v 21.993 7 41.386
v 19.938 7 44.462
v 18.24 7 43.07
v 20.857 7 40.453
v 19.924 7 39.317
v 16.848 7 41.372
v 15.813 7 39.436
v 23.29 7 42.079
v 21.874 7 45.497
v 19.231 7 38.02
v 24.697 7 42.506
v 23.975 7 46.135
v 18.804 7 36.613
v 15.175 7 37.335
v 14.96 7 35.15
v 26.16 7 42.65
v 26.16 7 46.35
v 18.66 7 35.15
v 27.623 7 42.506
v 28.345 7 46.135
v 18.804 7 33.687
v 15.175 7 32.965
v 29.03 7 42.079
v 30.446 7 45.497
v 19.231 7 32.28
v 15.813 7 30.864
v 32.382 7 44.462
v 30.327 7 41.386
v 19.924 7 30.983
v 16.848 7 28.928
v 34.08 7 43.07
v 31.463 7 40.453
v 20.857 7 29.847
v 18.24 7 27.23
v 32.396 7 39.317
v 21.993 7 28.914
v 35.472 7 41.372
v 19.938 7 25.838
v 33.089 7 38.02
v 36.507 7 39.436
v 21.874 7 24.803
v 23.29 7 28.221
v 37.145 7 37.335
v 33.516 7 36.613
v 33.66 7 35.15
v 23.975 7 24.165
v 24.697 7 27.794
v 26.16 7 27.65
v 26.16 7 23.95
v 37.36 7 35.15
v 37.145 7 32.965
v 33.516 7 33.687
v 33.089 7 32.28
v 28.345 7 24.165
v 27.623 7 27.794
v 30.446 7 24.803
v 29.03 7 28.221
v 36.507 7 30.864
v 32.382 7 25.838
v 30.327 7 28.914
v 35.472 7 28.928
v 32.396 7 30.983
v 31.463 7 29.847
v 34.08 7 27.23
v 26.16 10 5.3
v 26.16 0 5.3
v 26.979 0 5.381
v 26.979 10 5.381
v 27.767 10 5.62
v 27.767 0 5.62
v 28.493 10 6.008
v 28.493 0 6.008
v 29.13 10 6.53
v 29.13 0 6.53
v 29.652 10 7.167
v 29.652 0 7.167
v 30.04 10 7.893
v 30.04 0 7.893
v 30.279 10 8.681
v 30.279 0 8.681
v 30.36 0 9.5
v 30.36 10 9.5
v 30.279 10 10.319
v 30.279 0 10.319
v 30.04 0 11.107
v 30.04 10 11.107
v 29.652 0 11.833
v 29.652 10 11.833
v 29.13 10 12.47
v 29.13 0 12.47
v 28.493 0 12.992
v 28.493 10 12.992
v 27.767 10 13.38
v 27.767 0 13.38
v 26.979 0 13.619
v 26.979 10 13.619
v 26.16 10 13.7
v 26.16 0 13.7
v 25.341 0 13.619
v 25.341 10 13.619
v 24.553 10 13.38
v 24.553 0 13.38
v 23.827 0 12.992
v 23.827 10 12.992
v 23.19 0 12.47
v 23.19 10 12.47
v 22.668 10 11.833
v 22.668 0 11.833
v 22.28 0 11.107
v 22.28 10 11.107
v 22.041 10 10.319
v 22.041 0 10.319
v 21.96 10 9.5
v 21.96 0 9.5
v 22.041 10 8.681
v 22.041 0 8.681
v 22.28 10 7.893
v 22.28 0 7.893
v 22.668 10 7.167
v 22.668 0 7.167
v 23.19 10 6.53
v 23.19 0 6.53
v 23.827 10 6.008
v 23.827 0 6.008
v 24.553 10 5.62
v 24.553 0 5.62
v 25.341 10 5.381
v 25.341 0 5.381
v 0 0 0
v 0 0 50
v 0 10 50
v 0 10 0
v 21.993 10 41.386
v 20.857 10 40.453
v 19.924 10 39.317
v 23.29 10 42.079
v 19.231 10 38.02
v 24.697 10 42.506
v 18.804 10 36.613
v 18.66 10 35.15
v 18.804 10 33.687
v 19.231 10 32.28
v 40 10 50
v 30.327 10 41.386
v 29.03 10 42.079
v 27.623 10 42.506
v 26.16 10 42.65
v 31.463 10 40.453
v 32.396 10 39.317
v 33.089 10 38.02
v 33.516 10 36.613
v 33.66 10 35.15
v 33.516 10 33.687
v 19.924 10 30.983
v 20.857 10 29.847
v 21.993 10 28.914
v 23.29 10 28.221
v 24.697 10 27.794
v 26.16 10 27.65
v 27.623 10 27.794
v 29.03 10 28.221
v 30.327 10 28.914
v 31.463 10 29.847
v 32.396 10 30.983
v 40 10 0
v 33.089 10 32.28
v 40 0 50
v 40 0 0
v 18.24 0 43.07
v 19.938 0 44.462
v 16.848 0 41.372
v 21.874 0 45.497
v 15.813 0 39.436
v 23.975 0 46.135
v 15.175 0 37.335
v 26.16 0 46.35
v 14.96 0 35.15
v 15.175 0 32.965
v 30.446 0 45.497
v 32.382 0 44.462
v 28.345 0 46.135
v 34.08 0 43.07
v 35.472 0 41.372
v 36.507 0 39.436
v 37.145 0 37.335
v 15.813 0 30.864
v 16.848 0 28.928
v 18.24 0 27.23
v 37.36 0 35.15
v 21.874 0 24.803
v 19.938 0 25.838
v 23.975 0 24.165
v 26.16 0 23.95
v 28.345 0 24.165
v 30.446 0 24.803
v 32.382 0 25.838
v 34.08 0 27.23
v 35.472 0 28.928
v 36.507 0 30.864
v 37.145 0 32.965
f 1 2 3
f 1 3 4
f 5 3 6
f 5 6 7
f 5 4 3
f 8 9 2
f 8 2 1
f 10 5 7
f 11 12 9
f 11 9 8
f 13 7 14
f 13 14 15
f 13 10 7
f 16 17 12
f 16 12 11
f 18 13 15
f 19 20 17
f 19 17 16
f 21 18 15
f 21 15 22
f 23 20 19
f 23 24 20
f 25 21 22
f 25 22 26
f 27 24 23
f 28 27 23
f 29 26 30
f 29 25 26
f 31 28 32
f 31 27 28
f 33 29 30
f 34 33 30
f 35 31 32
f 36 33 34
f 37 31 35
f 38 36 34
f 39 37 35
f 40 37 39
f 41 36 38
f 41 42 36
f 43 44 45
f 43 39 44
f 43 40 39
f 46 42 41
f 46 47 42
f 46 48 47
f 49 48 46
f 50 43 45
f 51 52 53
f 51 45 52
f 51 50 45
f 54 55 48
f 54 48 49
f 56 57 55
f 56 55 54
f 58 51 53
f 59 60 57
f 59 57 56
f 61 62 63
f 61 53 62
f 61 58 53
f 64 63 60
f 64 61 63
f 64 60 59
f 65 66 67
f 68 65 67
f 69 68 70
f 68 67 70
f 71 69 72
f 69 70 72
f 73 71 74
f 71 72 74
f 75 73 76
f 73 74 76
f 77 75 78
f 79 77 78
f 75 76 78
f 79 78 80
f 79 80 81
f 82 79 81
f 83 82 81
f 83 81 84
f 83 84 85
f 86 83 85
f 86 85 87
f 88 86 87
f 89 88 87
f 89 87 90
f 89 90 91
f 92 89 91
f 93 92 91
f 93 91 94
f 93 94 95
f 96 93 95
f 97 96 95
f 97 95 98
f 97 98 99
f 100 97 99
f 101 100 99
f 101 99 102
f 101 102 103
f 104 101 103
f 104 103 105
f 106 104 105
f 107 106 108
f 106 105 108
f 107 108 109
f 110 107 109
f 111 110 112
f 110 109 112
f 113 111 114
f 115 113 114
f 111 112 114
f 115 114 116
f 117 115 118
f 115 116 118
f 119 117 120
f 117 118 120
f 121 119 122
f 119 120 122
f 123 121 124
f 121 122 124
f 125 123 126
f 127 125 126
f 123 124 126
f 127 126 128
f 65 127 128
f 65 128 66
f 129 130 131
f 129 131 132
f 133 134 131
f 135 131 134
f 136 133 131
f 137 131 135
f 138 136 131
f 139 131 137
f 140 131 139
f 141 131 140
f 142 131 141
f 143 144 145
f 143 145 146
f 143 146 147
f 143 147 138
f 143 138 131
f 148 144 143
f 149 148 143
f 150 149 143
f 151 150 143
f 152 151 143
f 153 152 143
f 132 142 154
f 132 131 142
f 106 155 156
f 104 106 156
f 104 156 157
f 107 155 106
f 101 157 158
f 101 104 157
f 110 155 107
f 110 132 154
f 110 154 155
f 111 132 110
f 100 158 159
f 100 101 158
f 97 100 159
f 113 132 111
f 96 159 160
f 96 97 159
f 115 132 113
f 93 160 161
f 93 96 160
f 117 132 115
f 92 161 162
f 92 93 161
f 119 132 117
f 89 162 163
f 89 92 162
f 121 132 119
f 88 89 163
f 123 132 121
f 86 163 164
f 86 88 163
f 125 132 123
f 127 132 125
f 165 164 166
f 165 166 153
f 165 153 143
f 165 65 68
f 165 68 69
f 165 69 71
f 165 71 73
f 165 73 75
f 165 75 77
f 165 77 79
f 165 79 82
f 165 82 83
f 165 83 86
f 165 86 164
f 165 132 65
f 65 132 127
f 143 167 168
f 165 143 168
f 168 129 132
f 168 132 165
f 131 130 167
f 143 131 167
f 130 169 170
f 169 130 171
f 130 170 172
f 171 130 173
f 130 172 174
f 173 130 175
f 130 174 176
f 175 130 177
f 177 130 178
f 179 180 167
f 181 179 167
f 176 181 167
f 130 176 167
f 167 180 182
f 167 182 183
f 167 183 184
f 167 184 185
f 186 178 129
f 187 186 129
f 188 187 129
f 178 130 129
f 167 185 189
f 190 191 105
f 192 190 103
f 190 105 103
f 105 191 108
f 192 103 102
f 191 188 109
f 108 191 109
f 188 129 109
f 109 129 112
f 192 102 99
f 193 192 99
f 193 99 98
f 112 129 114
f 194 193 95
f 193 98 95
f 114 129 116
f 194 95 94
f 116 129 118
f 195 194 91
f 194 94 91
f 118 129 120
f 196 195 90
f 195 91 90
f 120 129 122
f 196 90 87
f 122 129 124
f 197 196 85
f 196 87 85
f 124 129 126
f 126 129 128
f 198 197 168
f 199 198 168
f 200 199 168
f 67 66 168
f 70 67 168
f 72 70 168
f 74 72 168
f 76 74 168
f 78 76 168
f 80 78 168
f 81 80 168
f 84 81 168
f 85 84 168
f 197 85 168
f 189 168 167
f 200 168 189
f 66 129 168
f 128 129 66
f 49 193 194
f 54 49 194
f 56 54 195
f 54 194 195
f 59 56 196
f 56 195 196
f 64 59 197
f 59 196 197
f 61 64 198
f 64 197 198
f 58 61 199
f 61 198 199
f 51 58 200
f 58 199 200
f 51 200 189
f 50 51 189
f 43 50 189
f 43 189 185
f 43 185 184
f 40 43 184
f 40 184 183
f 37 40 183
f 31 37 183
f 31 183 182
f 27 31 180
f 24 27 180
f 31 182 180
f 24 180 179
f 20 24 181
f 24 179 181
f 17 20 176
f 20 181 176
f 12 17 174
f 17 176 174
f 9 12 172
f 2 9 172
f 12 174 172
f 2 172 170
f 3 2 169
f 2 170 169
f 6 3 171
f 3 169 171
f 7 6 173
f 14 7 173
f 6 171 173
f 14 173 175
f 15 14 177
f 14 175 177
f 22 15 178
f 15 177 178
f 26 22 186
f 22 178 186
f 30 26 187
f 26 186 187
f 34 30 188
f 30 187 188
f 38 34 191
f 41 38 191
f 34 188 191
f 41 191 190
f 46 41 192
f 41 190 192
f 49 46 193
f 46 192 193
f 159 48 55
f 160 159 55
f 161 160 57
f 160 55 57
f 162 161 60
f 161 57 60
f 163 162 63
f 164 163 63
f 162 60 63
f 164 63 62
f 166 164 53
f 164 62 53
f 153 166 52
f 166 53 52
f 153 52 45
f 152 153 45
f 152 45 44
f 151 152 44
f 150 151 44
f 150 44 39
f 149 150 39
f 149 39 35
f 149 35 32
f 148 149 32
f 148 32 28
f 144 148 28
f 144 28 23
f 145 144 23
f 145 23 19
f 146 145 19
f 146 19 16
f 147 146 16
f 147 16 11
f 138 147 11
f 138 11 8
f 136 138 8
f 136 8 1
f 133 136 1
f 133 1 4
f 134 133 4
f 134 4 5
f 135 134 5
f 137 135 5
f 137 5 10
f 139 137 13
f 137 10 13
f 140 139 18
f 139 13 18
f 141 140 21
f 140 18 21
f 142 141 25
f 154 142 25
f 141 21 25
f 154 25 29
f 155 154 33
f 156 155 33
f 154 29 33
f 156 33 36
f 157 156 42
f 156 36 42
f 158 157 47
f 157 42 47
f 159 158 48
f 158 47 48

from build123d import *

# Parameters (mm, degrees)
SKETCH2_W           = 40
SKETCH2_H           = 50
BOSS_EXTRUDE1_DEPTH = 10
SKETCH3_R           = 11.2
SKETCH3_R_2         = 7.5
CUT_EXTRUDE1_DEPTH  = 7
SKETCH4_R           = 7.5
SKETCH4_R_2         = 4.2
CUT_EXTRUDE2_DEPTH  = 65.807406984


with BuildPart() as part:
    # Sketch2 → Boss-Extrude1 (new body)
    with BuildSketch(Plane(origin=(0, 0, 0), x_dir=(1, 0, 0), z_dir=(0, 1, 0))):
        with Locations((20, -25)):
            Rectangle(SKETCH2_W, SKETCH2_H)
    extrude(amount=BOSS_EXTRUDE1_DEPTH)

    # Sketch3 → Cut-Extrude1 (cut)
    # profile 1 of 2: a face of its own
    with BuildSketch(Plane.XZ):
        with Locations(Location((26.16, 35.15, 0), (0, 0, 270))):
            Circle(SKETCH3_R)
        with Locations((26.16, 35.15)):
            Circle(SKETCH3_R_2, mode=Mode.SUBTRACT)
    # profile 2 of 2: a face of its own
    with BuildSketch(Plane.XZ):
        with Locations((26.16, 35.15)):
            Circle(SKETCH3_R_2)
    extrude(amount=-CUT_EXTRUDE1_DEPTH, mode=Mode.SUBTRACT)

    # Sketch4 → Cut-Extrude2 (cut, through all)
    with BuildSketch(Plane.XZ):
        with Locations(Location((26.16, 35.15, 0), (0, 0, 270))):
            Circle(SKETCH4_R)
        with Locations(Location((26.16, 9.5, 0), (0, 0, 270))):
            Circle(SKETCH4_R_2)
    extrude(amount=-CUT_EXTRUDE2_DEPTH, mode=Mode.SUBTRACT)


solid = part.part
